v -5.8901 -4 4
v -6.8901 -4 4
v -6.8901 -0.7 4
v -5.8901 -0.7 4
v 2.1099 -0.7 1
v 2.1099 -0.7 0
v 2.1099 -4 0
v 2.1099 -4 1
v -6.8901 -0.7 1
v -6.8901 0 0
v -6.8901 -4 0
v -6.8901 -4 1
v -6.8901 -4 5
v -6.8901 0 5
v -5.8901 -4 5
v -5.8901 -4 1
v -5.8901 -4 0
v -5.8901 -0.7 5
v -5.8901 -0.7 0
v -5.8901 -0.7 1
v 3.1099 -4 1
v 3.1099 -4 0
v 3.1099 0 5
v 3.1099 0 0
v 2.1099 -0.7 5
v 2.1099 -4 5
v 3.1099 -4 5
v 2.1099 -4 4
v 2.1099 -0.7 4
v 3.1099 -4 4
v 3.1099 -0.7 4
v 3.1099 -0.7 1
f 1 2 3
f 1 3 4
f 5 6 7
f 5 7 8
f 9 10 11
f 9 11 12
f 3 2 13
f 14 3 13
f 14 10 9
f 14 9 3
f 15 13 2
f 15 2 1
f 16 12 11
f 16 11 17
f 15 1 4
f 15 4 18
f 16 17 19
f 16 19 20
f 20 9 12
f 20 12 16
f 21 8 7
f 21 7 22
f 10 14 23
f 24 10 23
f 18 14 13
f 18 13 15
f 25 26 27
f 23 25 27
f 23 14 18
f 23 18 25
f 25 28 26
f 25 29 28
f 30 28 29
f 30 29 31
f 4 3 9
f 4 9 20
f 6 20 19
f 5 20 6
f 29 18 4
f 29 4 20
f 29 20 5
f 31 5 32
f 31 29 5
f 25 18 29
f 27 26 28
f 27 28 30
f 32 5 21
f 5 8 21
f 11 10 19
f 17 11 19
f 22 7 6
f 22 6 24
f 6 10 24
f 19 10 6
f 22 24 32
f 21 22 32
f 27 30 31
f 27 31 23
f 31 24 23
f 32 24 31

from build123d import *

# Parameters (mm, degrees)
F0_W     = 100
F0_H     = 50
F1_DEPTH = 25
F2_W     = 10
F2_H     = 10
F3_DEPTH = 15
F4_DEPTH = 18
F5_SCALE = 0.1


with BuildPart() as f1:
    # F0 (on Front) → F1 (new body)
    with BuildSketch(Plane.XZ):
        with Locations((-18.9008015549, 25)):
            Rectangle(F0_W, F0_H)
    extrude(amount=F1_DEPTH)

    # F2 (on face) → F3 (join)
    with BuildSketch(Plane.XZ.offset(25)):
        with Locations((-63.9008015549, 5)):
            Rectangle(F2_W, F2_H)
        with Locations((-63.9008015549, 45)):
            Rectangle(F2_W, F2_H)
        with Locations((26.0991984451, 45)):
            Rectangle(F2_W, F2_H)
        with Locations((26.0991984451, 5)):
            Rectangle(F2_W, F2_H)
    extrude(amount=F3_DEPTH)

    # F4 (cut): a face of the model
    f4_faces = [f1.faces().sort_by_distance(p)[0] for p in [
        (-18.9008015549, -25, 25),
    ]]
    extrude(f4_faces, amount=-F4_DEPTH, mode=Mode.SUBTRACT)


with BuildPart() as f1_1:
    # F5: moved
    add(f1.part.scale(F5_SCALE))


solid = f1_1.part
